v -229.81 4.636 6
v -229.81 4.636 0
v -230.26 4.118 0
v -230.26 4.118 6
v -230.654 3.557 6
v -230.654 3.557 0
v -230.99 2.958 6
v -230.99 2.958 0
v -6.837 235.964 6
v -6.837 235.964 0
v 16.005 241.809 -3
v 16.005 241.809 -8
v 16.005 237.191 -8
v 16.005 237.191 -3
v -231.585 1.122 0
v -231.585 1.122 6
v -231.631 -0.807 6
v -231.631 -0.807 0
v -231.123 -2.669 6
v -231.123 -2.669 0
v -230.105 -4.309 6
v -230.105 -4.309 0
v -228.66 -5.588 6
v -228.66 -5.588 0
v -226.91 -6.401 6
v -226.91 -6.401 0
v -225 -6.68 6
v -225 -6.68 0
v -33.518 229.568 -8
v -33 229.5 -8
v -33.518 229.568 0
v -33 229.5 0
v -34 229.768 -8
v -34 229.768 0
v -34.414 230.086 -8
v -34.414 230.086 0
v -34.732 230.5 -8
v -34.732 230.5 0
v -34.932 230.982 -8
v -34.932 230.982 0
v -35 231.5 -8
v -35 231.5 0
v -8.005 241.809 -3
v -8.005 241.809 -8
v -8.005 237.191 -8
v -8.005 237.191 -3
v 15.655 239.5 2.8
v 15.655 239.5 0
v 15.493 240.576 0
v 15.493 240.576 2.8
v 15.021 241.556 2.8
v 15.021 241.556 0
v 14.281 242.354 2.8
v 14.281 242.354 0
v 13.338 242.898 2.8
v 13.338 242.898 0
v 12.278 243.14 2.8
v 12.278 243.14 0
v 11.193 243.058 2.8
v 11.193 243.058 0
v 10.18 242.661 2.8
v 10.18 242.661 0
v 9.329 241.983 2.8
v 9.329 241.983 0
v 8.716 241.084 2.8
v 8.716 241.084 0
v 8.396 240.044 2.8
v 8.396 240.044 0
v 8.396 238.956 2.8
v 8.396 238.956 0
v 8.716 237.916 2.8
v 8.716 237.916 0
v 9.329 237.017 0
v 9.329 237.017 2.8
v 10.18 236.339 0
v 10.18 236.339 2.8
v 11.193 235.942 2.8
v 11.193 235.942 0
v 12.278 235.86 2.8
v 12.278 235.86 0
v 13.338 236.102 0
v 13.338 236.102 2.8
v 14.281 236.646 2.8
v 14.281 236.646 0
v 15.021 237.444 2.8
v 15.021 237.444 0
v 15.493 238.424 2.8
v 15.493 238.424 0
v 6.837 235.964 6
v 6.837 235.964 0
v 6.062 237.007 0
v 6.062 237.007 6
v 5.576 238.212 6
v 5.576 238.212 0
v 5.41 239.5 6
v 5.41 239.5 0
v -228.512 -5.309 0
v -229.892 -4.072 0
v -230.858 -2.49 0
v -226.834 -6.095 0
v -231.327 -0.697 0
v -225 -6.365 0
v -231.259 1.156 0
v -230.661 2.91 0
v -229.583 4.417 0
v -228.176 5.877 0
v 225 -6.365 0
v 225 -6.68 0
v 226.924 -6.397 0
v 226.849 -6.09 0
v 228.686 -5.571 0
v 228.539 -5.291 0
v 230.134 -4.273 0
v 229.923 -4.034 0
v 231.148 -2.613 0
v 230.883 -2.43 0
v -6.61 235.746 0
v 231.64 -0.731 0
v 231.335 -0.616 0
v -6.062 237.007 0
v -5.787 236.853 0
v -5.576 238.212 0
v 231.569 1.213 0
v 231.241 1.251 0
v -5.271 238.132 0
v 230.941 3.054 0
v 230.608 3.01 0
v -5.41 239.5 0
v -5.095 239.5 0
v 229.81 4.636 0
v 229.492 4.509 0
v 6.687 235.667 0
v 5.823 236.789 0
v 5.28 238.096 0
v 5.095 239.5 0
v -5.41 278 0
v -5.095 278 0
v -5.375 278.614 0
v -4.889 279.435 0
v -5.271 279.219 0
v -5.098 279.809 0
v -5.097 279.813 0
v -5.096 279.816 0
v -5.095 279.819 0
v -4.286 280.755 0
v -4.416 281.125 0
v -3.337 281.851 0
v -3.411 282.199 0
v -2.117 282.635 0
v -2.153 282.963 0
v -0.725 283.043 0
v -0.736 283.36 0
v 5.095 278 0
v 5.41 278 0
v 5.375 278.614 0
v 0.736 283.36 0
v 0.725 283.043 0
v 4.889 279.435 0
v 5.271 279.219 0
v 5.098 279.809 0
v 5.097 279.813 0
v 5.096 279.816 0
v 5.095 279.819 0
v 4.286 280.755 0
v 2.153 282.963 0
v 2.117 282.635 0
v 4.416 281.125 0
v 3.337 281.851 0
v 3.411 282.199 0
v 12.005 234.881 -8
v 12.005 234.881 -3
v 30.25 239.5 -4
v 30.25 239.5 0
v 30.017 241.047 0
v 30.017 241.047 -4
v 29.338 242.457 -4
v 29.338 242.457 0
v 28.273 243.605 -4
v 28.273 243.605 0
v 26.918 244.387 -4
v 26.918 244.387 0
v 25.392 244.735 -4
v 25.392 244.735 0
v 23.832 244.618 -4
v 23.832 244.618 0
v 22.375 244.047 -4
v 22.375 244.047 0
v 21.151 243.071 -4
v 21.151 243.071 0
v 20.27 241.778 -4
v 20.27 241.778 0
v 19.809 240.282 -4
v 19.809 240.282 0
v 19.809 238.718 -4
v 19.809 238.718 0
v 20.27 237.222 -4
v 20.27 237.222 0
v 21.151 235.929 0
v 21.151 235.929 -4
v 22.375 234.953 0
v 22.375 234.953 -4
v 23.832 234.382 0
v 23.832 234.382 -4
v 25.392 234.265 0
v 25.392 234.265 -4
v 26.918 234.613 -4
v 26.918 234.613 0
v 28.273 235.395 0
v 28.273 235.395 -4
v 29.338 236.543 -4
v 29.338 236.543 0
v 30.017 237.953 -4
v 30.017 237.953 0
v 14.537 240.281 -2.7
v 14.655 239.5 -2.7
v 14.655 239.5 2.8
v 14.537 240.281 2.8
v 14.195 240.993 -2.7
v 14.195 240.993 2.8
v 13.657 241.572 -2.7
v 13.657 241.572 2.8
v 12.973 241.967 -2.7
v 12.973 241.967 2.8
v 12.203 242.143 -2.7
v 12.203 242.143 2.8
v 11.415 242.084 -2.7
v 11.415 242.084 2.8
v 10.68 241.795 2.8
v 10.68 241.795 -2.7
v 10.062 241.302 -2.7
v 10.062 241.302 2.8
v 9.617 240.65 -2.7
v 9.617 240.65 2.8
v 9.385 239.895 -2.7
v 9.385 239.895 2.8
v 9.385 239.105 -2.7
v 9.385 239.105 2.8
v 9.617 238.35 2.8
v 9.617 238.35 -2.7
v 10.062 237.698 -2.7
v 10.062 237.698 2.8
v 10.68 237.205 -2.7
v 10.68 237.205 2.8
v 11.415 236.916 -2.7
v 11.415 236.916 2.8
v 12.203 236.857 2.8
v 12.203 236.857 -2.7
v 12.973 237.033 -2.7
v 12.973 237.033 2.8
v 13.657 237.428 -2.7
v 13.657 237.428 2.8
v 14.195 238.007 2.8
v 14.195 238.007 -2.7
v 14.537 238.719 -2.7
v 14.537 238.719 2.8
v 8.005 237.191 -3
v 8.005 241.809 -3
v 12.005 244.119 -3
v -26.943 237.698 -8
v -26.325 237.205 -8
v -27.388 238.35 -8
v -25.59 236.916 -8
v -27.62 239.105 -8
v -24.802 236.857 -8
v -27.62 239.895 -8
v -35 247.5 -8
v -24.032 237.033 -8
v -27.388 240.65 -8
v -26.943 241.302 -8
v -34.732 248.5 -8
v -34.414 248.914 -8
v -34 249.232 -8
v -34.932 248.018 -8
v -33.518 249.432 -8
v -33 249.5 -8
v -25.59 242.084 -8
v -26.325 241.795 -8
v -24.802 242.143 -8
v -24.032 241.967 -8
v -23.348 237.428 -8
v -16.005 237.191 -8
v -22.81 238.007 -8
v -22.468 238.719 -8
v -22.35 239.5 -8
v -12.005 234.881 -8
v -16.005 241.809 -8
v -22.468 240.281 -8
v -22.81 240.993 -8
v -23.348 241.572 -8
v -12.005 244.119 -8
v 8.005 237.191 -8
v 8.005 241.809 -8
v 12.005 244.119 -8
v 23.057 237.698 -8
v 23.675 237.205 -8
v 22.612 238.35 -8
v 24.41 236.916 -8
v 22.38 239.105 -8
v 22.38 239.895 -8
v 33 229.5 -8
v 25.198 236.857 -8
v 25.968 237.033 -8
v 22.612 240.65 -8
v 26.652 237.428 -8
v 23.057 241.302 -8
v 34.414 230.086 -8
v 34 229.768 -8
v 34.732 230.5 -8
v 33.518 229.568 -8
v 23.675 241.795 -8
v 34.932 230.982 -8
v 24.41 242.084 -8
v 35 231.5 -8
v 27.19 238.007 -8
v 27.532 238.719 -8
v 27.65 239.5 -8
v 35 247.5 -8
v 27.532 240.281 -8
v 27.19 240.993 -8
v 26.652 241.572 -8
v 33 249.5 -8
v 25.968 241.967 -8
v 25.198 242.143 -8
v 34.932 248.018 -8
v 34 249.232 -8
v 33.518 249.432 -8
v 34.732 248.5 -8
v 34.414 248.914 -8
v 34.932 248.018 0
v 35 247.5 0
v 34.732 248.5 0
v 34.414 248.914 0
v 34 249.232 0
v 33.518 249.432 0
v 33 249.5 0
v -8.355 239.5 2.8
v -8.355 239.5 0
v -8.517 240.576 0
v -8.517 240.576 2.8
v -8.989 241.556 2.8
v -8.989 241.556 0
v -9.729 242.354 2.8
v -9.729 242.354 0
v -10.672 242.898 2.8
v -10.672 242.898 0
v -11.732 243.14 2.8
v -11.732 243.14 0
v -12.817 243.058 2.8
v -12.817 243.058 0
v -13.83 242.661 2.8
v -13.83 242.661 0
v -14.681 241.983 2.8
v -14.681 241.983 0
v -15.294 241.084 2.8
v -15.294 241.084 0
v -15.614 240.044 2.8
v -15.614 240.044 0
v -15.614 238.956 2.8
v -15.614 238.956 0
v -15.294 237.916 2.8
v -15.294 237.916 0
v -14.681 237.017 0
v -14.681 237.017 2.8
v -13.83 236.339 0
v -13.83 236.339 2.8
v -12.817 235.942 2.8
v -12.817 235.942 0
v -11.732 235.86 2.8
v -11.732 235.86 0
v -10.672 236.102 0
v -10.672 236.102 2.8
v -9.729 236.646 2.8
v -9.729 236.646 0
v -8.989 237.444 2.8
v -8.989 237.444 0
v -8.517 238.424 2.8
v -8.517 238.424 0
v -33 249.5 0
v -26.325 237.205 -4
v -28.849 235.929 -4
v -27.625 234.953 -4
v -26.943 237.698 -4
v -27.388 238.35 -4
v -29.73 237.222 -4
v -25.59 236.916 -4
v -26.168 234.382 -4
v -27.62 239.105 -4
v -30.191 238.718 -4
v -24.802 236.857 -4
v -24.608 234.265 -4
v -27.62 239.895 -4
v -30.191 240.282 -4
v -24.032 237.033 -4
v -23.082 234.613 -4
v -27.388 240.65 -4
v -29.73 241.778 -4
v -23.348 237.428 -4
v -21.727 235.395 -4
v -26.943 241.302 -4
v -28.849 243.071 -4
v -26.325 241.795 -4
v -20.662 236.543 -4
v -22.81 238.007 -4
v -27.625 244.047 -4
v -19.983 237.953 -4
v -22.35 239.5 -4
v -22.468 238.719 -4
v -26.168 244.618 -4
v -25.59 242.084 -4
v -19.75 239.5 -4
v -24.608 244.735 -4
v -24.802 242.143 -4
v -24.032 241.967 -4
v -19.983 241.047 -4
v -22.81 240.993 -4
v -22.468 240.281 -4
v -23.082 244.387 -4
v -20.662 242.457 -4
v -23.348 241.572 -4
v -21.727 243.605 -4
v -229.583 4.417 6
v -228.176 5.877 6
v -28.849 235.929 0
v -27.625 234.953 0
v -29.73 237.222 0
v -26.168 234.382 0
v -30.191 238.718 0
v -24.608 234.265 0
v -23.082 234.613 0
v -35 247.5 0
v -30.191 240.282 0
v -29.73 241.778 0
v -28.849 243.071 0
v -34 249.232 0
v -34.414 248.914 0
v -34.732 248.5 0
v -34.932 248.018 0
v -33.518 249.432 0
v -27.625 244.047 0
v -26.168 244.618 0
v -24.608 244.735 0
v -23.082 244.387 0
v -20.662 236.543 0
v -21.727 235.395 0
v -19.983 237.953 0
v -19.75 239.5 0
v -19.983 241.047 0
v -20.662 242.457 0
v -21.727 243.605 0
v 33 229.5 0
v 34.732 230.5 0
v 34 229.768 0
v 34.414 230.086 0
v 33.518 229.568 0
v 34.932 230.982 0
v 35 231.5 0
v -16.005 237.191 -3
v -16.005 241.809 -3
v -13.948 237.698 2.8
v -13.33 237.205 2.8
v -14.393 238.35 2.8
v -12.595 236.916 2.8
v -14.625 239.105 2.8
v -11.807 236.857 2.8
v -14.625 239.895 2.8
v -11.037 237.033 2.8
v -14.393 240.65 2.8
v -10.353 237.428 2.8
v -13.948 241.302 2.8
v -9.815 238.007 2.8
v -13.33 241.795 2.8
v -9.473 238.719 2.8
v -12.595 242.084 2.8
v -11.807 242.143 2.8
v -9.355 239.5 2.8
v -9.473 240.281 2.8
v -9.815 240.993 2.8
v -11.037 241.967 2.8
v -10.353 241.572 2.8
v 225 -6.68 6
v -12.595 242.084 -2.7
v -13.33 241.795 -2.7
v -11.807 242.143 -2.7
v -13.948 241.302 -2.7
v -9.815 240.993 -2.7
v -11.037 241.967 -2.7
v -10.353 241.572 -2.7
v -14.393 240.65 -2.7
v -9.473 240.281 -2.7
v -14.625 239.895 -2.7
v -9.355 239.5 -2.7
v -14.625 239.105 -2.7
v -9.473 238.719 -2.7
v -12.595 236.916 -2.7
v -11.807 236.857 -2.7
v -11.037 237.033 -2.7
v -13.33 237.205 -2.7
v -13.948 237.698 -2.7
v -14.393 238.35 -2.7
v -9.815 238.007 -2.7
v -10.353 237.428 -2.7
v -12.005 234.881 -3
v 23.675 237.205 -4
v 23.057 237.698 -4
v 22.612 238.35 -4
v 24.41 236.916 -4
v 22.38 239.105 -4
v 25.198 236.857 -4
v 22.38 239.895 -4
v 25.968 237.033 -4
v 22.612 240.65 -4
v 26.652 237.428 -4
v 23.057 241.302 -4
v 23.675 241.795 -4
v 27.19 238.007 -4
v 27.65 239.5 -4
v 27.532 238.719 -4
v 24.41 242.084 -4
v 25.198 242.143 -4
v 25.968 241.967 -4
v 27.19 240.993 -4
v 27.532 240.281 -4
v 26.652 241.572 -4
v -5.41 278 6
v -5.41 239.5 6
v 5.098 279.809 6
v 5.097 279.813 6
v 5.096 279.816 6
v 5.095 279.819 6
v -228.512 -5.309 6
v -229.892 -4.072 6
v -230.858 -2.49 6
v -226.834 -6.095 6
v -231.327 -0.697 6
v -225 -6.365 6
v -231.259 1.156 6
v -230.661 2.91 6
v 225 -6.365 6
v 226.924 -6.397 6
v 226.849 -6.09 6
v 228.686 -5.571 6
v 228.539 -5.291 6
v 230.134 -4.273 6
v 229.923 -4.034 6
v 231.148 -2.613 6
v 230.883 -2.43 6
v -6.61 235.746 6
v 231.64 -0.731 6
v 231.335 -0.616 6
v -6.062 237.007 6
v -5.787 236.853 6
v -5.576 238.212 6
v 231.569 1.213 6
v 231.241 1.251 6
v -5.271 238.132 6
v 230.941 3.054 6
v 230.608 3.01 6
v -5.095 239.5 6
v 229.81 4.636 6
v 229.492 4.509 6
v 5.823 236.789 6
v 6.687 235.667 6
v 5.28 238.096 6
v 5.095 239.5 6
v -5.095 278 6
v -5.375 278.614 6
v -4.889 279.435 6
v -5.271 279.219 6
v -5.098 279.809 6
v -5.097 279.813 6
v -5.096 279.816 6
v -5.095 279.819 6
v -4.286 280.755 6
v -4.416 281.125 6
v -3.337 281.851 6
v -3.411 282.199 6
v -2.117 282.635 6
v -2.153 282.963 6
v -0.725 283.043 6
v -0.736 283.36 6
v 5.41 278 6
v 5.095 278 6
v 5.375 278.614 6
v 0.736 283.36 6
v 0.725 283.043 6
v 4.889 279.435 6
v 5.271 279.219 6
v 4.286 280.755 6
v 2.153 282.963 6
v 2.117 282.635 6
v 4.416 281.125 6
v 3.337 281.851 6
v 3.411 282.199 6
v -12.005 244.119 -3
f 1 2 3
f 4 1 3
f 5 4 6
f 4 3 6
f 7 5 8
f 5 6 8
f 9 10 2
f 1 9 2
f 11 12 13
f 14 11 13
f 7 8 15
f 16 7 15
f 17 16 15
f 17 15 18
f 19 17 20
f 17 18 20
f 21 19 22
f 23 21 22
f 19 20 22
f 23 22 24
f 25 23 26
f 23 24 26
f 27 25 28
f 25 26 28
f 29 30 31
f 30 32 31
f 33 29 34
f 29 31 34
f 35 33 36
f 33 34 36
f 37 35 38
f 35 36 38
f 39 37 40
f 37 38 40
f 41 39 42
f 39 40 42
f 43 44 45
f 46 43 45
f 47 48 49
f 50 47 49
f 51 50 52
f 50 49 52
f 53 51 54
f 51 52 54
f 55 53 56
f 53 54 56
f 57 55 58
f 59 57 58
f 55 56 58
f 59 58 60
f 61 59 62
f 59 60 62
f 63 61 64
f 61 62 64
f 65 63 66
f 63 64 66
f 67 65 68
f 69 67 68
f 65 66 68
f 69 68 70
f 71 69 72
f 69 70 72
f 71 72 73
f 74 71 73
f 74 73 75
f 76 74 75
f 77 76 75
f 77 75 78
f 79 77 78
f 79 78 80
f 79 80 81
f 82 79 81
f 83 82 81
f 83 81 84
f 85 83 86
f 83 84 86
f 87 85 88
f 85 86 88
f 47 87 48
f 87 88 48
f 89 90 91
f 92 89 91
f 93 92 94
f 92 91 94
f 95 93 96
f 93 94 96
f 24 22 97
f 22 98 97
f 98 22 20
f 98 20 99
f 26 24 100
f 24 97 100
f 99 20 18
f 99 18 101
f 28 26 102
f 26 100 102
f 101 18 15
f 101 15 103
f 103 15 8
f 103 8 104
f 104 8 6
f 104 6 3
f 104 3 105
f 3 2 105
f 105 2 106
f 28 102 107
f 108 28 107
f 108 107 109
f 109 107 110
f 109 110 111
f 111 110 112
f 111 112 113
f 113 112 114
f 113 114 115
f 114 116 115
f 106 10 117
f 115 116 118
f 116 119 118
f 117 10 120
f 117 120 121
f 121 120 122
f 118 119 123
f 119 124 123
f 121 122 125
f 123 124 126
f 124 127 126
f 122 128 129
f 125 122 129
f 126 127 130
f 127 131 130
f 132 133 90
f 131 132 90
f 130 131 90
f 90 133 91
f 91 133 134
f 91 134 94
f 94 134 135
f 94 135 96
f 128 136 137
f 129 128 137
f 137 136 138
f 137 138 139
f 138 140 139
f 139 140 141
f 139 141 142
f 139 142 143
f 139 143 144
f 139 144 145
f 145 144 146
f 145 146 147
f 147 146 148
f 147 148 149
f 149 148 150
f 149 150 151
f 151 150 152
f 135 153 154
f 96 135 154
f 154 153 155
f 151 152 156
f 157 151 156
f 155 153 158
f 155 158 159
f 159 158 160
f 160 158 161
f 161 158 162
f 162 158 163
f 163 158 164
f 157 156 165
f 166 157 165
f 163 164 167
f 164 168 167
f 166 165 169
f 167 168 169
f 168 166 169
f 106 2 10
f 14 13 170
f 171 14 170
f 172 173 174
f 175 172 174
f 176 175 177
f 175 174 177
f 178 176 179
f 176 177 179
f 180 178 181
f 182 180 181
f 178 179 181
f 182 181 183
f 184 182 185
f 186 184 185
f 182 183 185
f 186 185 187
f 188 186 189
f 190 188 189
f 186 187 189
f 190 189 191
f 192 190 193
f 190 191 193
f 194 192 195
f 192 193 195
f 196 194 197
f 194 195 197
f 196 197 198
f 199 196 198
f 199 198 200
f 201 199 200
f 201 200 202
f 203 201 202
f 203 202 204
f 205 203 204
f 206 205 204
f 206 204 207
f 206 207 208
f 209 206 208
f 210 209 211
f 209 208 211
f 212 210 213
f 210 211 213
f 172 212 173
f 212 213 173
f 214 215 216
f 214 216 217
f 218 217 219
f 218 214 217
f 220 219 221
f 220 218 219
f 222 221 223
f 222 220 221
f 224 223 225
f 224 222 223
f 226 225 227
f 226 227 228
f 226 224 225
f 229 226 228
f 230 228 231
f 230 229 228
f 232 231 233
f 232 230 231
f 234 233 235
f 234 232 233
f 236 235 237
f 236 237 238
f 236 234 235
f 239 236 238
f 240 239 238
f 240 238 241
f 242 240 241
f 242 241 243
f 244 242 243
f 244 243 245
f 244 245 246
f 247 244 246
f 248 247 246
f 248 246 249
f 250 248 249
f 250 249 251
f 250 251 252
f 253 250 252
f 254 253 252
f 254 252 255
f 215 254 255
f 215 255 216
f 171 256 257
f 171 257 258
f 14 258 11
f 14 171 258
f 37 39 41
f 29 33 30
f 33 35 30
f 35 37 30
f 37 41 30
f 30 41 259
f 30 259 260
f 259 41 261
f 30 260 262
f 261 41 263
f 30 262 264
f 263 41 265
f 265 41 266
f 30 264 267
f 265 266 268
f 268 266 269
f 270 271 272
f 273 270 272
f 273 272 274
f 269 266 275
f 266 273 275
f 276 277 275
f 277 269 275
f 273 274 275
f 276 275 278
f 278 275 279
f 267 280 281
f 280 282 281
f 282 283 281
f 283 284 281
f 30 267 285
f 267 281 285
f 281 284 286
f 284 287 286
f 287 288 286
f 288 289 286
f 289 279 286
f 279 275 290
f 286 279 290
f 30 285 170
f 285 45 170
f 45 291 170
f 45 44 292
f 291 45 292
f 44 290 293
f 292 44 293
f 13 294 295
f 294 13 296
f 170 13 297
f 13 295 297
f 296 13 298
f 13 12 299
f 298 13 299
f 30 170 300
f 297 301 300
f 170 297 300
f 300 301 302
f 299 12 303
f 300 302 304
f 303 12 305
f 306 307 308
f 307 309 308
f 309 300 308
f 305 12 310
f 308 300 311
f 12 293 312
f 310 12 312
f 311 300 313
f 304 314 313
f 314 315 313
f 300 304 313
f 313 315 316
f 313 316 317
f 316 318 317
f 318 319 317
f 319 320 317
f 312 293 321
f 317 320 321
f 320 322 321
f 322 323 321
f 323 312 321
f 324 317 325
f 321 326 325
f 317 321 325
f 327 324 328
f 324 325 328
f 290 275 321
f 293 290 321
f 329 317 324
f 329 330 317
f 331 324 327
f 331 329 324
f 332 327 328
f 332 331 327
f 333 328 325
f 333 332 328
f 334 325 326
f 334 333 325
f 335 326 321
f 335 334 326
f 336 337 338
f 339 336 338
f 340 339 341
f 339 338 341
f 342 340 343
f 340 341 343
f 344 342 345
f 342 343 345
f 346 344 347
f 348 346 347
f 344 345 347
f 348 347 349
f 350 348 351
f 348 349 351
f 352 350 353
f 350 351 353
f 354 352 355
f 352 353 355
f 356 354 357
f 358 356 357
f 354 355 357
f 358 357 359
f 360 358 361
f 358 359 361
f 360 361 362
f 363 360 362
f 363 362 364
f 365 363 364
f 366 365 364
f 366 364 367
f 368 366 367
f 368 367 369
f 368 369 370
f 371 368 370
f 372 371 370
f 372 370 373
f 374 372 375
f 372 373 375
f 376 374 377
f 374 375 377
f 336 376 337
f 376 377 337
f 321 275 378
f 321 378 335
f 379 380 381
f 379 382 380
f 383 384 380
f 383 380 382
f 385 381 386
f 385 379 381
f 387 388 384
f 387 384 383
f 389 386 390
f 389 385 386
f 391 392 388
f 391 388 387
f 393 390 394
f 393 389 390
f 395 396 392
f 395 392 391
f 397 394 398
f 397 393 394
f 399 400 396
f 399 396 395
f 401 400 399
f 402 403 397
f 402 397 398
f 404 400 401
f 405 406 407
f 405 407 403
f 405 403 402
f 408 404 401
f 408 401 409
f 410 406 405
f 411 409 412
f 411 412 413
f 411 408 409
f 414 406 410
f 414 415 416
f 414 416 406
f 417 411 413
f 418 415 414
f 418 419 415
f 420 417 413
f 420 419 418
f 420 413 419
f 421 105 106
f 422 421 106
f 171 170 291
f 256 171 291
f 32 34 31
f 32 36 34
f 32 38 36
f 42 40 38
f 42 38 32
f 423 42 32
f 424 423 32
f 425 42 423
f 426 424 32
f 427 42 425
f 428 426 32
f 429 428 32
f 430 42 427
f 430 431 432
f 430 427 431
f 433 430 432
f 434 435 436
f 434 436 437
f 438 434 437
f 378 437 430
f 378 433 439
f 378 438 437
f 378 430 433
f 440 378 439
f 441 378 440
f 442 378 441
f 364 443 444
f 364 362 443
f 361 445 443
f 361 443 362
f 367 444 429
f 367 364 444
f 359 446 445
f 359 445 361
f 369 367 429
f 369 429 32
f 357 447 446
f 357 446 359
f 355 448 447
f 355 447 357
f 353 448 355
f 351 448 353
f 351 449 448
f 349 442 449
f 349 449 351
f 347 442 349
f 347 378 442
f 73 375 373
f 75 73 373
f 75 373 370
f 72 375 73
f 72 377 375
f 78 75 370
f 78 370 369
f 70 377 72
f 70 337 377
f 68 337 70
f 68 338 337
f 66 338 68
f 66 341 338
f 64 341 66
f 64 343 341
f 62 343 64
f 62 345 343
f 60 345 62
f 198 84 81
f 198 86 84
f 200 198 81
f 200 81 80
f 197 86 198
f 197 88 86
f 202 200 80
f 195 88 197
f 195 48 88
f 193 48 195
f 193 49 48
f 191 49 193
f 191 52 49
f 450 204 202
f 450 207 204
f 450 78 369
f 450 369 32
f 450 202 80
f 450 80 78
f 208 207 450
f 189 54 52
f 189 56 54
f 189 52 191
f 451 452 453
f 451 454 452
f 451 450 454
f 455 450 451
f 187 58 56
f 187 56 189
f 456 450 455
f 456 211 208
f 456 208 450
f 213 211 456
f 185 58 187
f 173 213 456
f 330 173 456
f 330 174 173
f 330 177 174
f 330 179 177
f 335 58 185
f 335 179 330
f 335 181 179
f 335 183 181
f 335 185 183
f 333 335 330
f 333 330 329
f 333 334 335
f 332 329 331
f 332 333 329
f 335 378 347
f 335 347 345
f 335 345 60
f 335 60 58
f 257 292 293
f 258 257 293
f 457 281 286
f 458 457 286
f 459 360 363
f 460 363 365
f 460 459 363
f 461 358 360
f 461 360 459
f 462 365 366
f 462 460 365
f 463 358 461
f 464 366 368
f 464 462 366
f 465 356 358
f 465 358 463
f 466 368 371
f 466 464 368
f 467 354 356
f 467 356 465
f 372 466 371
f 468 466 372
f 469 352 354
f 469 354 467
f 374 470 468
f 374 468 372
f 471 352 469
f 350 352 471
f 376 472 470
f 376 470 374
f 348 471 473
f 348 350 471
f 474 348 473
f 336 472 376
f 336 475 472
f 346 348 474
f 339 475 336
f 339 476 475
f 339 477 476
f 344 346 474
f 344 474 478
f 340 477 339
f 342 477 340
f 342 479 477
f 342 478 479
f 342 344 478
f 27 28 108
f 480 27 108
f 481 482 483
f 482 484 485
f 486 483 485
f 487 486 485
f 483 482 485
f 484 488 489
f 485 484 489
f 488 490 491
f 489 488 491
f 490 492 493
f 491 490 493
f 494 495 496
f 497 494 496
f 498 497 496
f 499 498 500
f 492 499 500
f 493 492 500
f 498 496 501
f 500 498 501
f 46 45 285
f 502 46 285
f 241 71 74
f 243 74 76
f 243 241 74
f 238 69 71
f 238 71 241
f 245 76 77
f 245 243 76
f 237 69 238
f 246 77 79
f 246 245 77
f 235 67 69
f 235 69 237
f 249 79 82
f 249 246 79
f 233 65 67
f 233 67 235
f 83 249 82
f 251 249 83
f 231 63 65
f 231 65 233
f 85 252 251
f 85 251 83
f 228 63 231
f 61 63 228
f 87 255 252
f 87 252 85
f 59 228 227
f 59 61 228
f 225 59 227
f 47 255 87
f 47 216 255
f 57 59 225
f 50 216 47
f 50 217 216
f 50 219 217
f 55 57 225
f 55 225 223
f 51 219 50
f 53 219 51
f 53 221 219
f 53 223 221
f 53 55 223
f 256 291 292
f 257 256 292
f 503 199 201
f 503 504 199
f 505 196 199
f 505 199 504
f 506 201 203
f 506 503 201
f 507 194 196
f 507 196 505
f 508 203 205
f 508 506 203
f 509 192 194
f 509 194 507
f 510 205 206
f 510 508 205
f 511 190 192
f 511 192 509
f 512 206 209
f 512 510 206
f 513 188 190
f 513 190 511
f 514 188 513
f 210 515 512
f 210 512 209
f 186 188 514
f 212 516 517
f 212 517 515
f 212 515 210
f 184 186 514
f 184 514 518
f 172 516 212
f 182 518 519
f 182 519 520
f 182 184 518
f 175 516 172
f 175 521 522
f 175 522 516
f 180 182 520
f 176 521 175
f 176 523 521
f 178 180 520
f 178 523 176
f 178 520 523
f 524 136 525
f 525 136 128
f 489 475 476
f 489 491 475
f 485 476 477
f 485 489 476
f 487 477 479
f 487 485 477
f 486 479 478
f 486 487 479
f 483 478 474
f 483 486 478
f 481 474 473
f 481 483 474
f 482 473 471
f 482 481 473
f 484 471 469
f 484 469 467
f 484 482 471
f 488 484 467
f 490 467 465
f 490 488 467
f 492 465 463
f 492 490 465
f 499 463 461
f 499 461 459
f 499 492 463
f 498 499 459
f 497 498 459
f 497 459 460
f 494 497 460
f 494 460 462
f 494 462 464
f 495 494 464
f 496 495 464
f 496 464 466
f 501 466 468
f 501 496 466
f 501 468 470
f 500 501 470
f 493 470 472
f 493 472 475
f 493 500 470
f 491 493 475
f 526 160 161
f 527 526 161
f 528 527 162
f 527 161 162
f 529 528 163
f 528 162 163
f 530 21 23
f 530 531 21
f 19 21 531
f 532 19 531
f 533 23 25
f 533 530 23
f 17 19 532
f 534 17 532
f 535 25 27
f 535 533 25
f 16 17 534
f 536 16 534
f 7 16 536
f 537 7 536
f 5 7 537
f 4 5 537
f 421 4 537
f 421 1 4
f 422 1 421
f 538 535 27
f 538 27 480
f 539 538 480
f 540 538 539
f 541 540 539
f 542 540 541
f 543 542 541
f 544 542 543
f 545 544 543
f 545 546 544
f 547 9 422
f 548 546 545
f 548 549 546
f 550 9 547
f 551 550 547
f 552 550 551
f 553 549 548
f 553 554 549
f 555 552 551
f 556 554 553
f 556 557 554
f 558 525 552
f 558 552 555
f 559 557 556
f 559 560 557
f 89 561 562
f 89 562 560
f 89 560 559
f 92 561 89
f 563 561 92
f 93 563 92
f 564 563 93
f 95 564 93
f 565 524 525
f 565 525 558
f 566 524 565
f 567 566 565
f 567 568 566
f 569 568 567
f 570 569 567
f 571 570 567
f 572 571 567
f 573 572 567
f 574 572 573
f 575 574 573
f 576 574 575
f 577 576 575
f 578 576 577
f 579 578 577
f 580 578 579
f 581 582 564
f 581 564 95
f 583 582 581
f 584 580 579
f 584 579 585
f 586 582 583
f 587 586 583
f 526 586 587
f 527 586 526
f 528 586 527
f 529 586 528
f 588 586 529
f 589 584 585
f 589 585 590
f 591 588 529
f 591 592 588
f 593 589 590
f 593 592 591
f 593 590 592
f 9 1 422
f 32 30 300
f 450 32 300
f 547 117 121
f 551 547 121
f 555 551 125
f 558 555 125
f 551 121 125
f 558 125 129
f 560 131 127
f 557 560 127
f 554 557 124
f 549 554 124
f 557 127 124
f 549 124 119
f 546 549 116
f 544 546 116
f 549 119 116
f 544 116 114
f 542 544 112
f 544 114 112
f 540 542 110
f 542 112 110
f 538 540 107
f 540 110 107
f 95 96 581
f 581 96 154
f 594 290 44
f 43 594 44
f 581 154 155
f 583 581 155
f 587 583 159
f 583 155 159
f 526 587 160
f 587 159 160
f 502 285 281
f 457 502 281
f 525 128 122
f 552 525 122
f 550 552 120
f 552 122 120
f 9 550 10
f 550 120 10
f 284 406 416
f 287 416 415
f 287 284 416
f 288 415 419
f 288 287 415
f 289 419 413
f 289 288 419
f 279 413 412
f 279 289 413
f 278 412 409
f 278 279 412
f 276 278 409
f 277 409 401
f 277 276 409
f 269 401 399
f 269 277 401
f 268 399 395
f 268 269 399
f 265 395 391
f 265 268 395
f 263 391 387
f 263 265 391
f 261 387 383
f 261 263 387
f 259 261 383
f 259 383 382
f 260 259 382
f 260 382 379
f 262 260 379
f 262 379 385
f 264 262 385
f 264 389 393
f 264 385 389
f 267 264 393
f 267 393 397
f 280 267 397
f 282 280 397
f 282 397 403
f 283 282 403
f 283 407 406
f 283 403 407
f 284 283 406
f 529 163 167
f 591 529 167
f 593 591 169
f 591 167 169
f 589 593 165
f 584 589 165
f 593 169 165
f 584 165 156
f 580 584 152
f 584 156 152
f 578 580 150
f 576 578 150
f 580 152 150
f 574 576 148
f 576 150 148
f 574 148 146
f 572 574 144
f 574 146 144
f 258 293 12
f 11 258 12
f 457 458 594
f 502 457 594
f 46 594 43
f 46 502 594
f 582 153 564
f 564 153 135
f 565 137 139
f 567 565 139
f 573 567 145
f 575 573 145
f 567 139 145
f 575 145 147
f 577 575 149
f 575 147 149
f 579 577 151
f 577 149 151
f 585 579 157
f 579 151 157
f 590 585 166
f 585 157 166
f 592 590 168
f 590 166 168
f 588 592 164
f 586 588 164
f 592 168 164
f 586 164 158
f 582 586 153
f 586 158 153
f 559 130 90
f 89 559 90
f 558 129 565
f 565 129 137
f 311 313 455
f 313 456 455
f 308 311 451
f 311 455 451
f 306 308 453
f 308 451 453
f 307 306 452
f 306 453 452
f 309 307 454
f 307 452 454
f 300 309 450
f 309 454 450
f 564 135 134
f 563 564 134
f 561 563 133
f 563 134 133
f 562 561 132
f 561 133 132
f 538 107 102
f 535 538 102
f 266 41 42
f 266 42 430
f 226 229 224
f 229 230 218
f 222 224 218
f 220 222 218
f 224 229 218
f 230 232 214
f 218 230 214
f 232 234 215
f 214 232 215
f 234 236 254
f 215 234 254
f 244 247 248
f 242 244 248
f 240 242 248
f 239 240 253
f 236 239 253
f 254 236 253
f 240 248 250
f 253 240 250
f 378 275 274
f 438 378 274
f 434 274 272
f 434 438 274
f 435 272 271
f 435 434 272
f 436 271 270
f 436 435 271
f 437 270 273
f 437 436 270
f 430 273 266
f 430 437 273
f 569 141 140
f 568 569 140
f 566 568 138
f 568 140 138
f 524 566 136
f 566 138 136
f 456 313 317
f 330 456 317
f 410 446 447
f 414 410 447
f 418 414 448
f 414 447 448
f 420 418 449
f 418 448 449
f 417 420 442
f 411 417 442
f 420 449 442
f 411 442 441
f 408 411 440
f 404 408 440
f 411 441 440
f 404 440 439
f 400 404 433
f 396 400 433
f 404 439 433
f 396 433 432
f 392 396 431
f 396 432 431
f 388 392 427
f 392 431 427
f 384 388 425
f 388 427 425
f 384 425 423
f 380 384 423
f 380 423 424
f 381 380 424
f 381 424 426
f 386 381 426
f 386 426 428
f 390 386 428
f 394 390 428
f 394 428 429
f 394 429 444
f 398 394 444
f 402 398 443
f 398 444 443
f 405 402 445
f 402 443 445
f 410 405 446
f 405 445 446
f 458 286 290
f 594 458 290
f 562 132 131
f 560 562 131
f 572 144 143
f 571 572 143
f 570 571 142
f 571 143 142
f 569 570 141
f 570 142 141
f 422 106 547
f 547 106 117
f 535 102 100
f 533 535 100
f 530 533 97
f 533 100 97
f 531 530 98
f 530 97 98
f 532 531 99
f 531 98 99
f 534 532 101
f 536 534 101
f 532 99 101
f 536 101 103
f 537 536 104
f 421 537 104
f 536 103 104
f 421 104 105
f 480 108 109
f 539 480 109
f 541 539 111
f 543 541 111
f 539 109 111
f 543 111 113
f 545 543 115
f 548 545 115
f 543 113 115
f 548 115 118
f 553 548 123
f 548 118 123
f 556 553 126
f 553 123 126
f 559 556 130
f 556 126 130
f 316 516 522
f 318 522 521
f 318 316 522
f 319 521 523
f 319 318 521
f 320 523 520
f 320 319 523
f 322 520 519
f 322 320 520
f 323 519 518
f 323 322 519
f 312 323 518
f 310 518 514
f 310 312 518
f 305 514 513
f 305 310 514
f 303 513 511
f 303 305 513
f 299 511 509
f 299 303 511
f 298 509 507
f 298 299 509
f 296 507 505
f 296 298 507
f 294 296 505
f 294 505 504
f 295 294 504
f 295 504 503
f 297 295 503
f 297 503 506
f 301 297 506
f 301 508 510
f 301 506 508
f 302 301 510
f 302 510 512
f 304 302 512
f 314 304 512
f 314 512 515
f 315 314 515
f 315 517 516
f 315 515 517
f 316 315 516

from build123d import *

# Parameters (mm, degrees)
F1_DEPTH  = 6
F2_W      = 70
F2_H      = 20
F2_R      = 2.65
F3_DEPTH  = 8
F4_R      = 5.25
F5_DEPTH  = 4
F6_R      = 3.65
F6_R_2    = 2.65
F7_DEPTH  = 2.8
F8_R      = 2
F10_DEPTH = 5
F12_R     = 2.65
F13_DEPTH = 0.3


with BuildPart() as f1:
    # F0 (on Top) → F1 (new body)
    with BuildSketch(Plane.XY):
        with BuildLine():
            ThreePointArc((-225, -6.365), (-230.8578482619, -2.4897467223), (-229.5827363738, 4.4172109219))
            Line((-229.5827363738, 4.4172109219), (-230.9895193158, 2.9577116773))
            ThreePointArc((-230.9895193158, 2.9577116773), (-230.6736193917, -3.5259669593), (-225, -6.68))
            Line((-225, -6.68), (225, -6.68))
            ThreePointArc((225, -6.68), (231.1477495637, -2.6129629354), (229.8095334569, 4.635815778))
            Line((229.8095334569, 4.635815778), (6.8366507541, 235.9641494927))
            ThreePointArc((6.8366507541, 235.9641494927), (5.780105059, 237.5935916502), (5.41, 239.5))
            Line((5.41, 239.5), (5.41, 278))
            ThreePointArc((5.41, 278), (5.3315361416, 278.9180535776), (5.0984205651, 279.809477201))
            Line((5.0984205651, 279.809477201), (5.095, 279.8136729438))
            Line((5.095, 279.8136729438), (5.095, 279.8190863091))
            ThreePointArc((5.095, 279.8190863091), (0, 283.41), (-5.095, 279.8190863091))
            Line((-5.095, 279.8190863091), (-5.095, 279.8136729438))
            Line((-5.095, 279.8136729438), (-5.0984205651, 279.809477201))
            ThreePointArc((-5.0984205651, 279.809477201), (-5.3315361416, 278.9180535776), (-5.41, 278))
            Line((-5.41, 278), (-5.41, 239.5))
            ThreePointArc((-5.41, 239.5), (-5.780105059, 237.5935916502), (-6.8366507541, 235.9641494927))
            Line((-6.8366507541, 235.9641494927), (-229.8095334569, 4.635815778))
            ThreePointArc((-229.8095334569, 4.635815778), (-229.040662868, 5.3193461616), (-228.1759538737, 5.876709708))
            Line((-228.1759538737, 5.876709708), (-6.609853892, 235.7455444074))
            ThreePointArc((-6.609853892, 235.7455444074), (-5.4879869223, 237.475727346), (-5.095, 239.5))
            Line((-5.095, 239.5), (-5.095, 278))
            ThreePointArc((-5.095, 278), (0, 283.095), (5.095, 278))
            Line((5.095, 278), (5.095, 239.5))
            ThreePointArc((5.095, 239.5), (5.5088128874, 237.4248579962), (6.6869461501, 235.6671727408))
            Line((6.6869461501, 235.6671727408), (229.4920356293, 4.5094169141))
            ThreePointArc((229.4920356293, 4.5094169141), (230.8828421557, -2.4301014734), (225, -6.365))
            Line((225, -6.365), (-225, -6.365))
        make_face()
        with BuildLine():
            Line((-230.9895193158, 2.9577116773), (-229.5827363738, 4.4172109219))
            Line((-229.5827363738, 4.4172109219), (-228.1759538737, 5.876709708))
            ThreePointArc((-228.1759538737, 5.876709708), (-229.040662868, 5.3193461616), (-229.8095334569, 4.635815778))
            ThreePointArc((-229.8095334569, 4.635815778), (-230.4643291939, 3.8423308629), (-230.9895193158, 2.9577116773))
        make_face()
        with BuildLine():
            ThreePointArc((-5.095, 279.8190863091), (-5.0967125471, 279.8142825612), (-5.0984205651, 279.809477201))
            Line((-5.0984205651, 279.809477201), (-5.095, 279.8136729438))
            Line((-5.095, 279.8136729438), (-5.095, 279.8190863091))
        make_face()
        with BuildLine():
            ThreePointArc((5.0984205651, 279.809477201), (5.0967125471, 279.8142825612), (5.095, 279.8190863091))
            Line((5.095, 279.8190863091), (5.095, 279.8136729438))
            Line((5.095, 279.8136729438), (5.0984205651, 279.809477201))
        make_face()
    extrude(amount=F1_DEPTH)


with BuildPart() as f3:
    # F2 (on Top) → F3 (new body)
    with BuildSketch(Plane.XY):
        with Locations((0, 239.5)):
            Rectangle(F2_W, F2_H)
        with Locations((-25, 239.5)):
            Circle(F2_R, mode=Mode.SUBTRACT)
        with Locations((-12.005, 239.5)):
            Circle(F2_R, mode=Mode.SUBTRACT)
        with Locations((12.005, 239.5)):
            Circle(F2_R, mode=Mode.SUBTRACT)
        with Locations((25, 239.5)):
            Circle(F2_R, mode=Mode.SUBTRACT)
    extrude(amount=F3_DEPTH)

    # F4 (on face) → F5 (cut)
    with BuildSketch(Plane.XY.offset(8)):
        with Locations((-25, 239.5)):
            Circle(F4_R)
        with Locations((25, 239.5)):
            Circle(F4_R)
    extrude(amount=-F5_DEPTH, mode=Mode.SUBTRACT)

    # F6 (on face) → F7 (join)
    with BuildSketch(Plane.XY.offset(8)):
        with Locations((-12.005, 239.5)):
            Circle(F6_R)
        with Locations((-12.005, 239.5)):
            Circle(F6_R_2, mode=Mode.SUBTRACT)
        with Locations((12.005, 239.5)):
            Circle(F6_R)
        with Locations((12.005, 239.5)):
            Circle(F6_R_2, mode=Mode.SUBTRACT)
    extrude(amount=F7_DEPTH)

    # F8
    f8_edges = [f3.edges().sort_by_distance(p)[0] for p in [
        (-35, 229.5, 4),
        (-35, 249.5, 4),
        (35, 249.5, 4),
        (35, 229.5, 4),
    ]]
    fillet(f8_edges, radius=F8_R)

    # F9 (on face) → F10 (cut)
    with BuildSketch(Plane(origin=(0, 0, 0), x_dir=(1, 0, 0), z_dir=(0, 0, -1))):
        Polygon((-8.005, -241.8094010768), (-8.005, -237.1905989232), (-12.005, -234.8811978465), (-16.005, -237.1905989232), (-16.005, -241.8094010768), (-12.005, -244.1188021535), align=None)
        Polygon((16.005, -241.8094010768), (16.005, -237.1905989232), (12.005, -234.8811978465), (8.005, -237.1905989232), (8.005, -241.8094010768), (12.005, -244.1188021535), align=None)
    extrude(amount=-F10_DEPTH, mode=Mode.SUBTRACT)


with BuildPart() as f3_1:
    # F11: moved
    add(f3.part.moved(Location((0, 0, -8))))

    # F12 (on face) → F13 (join)
    with BuildSketch(Plane(origin=(0, 0, -3), x_dir=(1, 0, 0), z_dir=(0, 0, -1))):
        with Locations((12.005, -239.5)):
            Circle(F12_R)
        with Locations((-12.005, -239.5)):
            Circle(F12_R)
    extrude(amount=-F13_DEPTH)


solid = Compound([f1.part, f3_1.part])
